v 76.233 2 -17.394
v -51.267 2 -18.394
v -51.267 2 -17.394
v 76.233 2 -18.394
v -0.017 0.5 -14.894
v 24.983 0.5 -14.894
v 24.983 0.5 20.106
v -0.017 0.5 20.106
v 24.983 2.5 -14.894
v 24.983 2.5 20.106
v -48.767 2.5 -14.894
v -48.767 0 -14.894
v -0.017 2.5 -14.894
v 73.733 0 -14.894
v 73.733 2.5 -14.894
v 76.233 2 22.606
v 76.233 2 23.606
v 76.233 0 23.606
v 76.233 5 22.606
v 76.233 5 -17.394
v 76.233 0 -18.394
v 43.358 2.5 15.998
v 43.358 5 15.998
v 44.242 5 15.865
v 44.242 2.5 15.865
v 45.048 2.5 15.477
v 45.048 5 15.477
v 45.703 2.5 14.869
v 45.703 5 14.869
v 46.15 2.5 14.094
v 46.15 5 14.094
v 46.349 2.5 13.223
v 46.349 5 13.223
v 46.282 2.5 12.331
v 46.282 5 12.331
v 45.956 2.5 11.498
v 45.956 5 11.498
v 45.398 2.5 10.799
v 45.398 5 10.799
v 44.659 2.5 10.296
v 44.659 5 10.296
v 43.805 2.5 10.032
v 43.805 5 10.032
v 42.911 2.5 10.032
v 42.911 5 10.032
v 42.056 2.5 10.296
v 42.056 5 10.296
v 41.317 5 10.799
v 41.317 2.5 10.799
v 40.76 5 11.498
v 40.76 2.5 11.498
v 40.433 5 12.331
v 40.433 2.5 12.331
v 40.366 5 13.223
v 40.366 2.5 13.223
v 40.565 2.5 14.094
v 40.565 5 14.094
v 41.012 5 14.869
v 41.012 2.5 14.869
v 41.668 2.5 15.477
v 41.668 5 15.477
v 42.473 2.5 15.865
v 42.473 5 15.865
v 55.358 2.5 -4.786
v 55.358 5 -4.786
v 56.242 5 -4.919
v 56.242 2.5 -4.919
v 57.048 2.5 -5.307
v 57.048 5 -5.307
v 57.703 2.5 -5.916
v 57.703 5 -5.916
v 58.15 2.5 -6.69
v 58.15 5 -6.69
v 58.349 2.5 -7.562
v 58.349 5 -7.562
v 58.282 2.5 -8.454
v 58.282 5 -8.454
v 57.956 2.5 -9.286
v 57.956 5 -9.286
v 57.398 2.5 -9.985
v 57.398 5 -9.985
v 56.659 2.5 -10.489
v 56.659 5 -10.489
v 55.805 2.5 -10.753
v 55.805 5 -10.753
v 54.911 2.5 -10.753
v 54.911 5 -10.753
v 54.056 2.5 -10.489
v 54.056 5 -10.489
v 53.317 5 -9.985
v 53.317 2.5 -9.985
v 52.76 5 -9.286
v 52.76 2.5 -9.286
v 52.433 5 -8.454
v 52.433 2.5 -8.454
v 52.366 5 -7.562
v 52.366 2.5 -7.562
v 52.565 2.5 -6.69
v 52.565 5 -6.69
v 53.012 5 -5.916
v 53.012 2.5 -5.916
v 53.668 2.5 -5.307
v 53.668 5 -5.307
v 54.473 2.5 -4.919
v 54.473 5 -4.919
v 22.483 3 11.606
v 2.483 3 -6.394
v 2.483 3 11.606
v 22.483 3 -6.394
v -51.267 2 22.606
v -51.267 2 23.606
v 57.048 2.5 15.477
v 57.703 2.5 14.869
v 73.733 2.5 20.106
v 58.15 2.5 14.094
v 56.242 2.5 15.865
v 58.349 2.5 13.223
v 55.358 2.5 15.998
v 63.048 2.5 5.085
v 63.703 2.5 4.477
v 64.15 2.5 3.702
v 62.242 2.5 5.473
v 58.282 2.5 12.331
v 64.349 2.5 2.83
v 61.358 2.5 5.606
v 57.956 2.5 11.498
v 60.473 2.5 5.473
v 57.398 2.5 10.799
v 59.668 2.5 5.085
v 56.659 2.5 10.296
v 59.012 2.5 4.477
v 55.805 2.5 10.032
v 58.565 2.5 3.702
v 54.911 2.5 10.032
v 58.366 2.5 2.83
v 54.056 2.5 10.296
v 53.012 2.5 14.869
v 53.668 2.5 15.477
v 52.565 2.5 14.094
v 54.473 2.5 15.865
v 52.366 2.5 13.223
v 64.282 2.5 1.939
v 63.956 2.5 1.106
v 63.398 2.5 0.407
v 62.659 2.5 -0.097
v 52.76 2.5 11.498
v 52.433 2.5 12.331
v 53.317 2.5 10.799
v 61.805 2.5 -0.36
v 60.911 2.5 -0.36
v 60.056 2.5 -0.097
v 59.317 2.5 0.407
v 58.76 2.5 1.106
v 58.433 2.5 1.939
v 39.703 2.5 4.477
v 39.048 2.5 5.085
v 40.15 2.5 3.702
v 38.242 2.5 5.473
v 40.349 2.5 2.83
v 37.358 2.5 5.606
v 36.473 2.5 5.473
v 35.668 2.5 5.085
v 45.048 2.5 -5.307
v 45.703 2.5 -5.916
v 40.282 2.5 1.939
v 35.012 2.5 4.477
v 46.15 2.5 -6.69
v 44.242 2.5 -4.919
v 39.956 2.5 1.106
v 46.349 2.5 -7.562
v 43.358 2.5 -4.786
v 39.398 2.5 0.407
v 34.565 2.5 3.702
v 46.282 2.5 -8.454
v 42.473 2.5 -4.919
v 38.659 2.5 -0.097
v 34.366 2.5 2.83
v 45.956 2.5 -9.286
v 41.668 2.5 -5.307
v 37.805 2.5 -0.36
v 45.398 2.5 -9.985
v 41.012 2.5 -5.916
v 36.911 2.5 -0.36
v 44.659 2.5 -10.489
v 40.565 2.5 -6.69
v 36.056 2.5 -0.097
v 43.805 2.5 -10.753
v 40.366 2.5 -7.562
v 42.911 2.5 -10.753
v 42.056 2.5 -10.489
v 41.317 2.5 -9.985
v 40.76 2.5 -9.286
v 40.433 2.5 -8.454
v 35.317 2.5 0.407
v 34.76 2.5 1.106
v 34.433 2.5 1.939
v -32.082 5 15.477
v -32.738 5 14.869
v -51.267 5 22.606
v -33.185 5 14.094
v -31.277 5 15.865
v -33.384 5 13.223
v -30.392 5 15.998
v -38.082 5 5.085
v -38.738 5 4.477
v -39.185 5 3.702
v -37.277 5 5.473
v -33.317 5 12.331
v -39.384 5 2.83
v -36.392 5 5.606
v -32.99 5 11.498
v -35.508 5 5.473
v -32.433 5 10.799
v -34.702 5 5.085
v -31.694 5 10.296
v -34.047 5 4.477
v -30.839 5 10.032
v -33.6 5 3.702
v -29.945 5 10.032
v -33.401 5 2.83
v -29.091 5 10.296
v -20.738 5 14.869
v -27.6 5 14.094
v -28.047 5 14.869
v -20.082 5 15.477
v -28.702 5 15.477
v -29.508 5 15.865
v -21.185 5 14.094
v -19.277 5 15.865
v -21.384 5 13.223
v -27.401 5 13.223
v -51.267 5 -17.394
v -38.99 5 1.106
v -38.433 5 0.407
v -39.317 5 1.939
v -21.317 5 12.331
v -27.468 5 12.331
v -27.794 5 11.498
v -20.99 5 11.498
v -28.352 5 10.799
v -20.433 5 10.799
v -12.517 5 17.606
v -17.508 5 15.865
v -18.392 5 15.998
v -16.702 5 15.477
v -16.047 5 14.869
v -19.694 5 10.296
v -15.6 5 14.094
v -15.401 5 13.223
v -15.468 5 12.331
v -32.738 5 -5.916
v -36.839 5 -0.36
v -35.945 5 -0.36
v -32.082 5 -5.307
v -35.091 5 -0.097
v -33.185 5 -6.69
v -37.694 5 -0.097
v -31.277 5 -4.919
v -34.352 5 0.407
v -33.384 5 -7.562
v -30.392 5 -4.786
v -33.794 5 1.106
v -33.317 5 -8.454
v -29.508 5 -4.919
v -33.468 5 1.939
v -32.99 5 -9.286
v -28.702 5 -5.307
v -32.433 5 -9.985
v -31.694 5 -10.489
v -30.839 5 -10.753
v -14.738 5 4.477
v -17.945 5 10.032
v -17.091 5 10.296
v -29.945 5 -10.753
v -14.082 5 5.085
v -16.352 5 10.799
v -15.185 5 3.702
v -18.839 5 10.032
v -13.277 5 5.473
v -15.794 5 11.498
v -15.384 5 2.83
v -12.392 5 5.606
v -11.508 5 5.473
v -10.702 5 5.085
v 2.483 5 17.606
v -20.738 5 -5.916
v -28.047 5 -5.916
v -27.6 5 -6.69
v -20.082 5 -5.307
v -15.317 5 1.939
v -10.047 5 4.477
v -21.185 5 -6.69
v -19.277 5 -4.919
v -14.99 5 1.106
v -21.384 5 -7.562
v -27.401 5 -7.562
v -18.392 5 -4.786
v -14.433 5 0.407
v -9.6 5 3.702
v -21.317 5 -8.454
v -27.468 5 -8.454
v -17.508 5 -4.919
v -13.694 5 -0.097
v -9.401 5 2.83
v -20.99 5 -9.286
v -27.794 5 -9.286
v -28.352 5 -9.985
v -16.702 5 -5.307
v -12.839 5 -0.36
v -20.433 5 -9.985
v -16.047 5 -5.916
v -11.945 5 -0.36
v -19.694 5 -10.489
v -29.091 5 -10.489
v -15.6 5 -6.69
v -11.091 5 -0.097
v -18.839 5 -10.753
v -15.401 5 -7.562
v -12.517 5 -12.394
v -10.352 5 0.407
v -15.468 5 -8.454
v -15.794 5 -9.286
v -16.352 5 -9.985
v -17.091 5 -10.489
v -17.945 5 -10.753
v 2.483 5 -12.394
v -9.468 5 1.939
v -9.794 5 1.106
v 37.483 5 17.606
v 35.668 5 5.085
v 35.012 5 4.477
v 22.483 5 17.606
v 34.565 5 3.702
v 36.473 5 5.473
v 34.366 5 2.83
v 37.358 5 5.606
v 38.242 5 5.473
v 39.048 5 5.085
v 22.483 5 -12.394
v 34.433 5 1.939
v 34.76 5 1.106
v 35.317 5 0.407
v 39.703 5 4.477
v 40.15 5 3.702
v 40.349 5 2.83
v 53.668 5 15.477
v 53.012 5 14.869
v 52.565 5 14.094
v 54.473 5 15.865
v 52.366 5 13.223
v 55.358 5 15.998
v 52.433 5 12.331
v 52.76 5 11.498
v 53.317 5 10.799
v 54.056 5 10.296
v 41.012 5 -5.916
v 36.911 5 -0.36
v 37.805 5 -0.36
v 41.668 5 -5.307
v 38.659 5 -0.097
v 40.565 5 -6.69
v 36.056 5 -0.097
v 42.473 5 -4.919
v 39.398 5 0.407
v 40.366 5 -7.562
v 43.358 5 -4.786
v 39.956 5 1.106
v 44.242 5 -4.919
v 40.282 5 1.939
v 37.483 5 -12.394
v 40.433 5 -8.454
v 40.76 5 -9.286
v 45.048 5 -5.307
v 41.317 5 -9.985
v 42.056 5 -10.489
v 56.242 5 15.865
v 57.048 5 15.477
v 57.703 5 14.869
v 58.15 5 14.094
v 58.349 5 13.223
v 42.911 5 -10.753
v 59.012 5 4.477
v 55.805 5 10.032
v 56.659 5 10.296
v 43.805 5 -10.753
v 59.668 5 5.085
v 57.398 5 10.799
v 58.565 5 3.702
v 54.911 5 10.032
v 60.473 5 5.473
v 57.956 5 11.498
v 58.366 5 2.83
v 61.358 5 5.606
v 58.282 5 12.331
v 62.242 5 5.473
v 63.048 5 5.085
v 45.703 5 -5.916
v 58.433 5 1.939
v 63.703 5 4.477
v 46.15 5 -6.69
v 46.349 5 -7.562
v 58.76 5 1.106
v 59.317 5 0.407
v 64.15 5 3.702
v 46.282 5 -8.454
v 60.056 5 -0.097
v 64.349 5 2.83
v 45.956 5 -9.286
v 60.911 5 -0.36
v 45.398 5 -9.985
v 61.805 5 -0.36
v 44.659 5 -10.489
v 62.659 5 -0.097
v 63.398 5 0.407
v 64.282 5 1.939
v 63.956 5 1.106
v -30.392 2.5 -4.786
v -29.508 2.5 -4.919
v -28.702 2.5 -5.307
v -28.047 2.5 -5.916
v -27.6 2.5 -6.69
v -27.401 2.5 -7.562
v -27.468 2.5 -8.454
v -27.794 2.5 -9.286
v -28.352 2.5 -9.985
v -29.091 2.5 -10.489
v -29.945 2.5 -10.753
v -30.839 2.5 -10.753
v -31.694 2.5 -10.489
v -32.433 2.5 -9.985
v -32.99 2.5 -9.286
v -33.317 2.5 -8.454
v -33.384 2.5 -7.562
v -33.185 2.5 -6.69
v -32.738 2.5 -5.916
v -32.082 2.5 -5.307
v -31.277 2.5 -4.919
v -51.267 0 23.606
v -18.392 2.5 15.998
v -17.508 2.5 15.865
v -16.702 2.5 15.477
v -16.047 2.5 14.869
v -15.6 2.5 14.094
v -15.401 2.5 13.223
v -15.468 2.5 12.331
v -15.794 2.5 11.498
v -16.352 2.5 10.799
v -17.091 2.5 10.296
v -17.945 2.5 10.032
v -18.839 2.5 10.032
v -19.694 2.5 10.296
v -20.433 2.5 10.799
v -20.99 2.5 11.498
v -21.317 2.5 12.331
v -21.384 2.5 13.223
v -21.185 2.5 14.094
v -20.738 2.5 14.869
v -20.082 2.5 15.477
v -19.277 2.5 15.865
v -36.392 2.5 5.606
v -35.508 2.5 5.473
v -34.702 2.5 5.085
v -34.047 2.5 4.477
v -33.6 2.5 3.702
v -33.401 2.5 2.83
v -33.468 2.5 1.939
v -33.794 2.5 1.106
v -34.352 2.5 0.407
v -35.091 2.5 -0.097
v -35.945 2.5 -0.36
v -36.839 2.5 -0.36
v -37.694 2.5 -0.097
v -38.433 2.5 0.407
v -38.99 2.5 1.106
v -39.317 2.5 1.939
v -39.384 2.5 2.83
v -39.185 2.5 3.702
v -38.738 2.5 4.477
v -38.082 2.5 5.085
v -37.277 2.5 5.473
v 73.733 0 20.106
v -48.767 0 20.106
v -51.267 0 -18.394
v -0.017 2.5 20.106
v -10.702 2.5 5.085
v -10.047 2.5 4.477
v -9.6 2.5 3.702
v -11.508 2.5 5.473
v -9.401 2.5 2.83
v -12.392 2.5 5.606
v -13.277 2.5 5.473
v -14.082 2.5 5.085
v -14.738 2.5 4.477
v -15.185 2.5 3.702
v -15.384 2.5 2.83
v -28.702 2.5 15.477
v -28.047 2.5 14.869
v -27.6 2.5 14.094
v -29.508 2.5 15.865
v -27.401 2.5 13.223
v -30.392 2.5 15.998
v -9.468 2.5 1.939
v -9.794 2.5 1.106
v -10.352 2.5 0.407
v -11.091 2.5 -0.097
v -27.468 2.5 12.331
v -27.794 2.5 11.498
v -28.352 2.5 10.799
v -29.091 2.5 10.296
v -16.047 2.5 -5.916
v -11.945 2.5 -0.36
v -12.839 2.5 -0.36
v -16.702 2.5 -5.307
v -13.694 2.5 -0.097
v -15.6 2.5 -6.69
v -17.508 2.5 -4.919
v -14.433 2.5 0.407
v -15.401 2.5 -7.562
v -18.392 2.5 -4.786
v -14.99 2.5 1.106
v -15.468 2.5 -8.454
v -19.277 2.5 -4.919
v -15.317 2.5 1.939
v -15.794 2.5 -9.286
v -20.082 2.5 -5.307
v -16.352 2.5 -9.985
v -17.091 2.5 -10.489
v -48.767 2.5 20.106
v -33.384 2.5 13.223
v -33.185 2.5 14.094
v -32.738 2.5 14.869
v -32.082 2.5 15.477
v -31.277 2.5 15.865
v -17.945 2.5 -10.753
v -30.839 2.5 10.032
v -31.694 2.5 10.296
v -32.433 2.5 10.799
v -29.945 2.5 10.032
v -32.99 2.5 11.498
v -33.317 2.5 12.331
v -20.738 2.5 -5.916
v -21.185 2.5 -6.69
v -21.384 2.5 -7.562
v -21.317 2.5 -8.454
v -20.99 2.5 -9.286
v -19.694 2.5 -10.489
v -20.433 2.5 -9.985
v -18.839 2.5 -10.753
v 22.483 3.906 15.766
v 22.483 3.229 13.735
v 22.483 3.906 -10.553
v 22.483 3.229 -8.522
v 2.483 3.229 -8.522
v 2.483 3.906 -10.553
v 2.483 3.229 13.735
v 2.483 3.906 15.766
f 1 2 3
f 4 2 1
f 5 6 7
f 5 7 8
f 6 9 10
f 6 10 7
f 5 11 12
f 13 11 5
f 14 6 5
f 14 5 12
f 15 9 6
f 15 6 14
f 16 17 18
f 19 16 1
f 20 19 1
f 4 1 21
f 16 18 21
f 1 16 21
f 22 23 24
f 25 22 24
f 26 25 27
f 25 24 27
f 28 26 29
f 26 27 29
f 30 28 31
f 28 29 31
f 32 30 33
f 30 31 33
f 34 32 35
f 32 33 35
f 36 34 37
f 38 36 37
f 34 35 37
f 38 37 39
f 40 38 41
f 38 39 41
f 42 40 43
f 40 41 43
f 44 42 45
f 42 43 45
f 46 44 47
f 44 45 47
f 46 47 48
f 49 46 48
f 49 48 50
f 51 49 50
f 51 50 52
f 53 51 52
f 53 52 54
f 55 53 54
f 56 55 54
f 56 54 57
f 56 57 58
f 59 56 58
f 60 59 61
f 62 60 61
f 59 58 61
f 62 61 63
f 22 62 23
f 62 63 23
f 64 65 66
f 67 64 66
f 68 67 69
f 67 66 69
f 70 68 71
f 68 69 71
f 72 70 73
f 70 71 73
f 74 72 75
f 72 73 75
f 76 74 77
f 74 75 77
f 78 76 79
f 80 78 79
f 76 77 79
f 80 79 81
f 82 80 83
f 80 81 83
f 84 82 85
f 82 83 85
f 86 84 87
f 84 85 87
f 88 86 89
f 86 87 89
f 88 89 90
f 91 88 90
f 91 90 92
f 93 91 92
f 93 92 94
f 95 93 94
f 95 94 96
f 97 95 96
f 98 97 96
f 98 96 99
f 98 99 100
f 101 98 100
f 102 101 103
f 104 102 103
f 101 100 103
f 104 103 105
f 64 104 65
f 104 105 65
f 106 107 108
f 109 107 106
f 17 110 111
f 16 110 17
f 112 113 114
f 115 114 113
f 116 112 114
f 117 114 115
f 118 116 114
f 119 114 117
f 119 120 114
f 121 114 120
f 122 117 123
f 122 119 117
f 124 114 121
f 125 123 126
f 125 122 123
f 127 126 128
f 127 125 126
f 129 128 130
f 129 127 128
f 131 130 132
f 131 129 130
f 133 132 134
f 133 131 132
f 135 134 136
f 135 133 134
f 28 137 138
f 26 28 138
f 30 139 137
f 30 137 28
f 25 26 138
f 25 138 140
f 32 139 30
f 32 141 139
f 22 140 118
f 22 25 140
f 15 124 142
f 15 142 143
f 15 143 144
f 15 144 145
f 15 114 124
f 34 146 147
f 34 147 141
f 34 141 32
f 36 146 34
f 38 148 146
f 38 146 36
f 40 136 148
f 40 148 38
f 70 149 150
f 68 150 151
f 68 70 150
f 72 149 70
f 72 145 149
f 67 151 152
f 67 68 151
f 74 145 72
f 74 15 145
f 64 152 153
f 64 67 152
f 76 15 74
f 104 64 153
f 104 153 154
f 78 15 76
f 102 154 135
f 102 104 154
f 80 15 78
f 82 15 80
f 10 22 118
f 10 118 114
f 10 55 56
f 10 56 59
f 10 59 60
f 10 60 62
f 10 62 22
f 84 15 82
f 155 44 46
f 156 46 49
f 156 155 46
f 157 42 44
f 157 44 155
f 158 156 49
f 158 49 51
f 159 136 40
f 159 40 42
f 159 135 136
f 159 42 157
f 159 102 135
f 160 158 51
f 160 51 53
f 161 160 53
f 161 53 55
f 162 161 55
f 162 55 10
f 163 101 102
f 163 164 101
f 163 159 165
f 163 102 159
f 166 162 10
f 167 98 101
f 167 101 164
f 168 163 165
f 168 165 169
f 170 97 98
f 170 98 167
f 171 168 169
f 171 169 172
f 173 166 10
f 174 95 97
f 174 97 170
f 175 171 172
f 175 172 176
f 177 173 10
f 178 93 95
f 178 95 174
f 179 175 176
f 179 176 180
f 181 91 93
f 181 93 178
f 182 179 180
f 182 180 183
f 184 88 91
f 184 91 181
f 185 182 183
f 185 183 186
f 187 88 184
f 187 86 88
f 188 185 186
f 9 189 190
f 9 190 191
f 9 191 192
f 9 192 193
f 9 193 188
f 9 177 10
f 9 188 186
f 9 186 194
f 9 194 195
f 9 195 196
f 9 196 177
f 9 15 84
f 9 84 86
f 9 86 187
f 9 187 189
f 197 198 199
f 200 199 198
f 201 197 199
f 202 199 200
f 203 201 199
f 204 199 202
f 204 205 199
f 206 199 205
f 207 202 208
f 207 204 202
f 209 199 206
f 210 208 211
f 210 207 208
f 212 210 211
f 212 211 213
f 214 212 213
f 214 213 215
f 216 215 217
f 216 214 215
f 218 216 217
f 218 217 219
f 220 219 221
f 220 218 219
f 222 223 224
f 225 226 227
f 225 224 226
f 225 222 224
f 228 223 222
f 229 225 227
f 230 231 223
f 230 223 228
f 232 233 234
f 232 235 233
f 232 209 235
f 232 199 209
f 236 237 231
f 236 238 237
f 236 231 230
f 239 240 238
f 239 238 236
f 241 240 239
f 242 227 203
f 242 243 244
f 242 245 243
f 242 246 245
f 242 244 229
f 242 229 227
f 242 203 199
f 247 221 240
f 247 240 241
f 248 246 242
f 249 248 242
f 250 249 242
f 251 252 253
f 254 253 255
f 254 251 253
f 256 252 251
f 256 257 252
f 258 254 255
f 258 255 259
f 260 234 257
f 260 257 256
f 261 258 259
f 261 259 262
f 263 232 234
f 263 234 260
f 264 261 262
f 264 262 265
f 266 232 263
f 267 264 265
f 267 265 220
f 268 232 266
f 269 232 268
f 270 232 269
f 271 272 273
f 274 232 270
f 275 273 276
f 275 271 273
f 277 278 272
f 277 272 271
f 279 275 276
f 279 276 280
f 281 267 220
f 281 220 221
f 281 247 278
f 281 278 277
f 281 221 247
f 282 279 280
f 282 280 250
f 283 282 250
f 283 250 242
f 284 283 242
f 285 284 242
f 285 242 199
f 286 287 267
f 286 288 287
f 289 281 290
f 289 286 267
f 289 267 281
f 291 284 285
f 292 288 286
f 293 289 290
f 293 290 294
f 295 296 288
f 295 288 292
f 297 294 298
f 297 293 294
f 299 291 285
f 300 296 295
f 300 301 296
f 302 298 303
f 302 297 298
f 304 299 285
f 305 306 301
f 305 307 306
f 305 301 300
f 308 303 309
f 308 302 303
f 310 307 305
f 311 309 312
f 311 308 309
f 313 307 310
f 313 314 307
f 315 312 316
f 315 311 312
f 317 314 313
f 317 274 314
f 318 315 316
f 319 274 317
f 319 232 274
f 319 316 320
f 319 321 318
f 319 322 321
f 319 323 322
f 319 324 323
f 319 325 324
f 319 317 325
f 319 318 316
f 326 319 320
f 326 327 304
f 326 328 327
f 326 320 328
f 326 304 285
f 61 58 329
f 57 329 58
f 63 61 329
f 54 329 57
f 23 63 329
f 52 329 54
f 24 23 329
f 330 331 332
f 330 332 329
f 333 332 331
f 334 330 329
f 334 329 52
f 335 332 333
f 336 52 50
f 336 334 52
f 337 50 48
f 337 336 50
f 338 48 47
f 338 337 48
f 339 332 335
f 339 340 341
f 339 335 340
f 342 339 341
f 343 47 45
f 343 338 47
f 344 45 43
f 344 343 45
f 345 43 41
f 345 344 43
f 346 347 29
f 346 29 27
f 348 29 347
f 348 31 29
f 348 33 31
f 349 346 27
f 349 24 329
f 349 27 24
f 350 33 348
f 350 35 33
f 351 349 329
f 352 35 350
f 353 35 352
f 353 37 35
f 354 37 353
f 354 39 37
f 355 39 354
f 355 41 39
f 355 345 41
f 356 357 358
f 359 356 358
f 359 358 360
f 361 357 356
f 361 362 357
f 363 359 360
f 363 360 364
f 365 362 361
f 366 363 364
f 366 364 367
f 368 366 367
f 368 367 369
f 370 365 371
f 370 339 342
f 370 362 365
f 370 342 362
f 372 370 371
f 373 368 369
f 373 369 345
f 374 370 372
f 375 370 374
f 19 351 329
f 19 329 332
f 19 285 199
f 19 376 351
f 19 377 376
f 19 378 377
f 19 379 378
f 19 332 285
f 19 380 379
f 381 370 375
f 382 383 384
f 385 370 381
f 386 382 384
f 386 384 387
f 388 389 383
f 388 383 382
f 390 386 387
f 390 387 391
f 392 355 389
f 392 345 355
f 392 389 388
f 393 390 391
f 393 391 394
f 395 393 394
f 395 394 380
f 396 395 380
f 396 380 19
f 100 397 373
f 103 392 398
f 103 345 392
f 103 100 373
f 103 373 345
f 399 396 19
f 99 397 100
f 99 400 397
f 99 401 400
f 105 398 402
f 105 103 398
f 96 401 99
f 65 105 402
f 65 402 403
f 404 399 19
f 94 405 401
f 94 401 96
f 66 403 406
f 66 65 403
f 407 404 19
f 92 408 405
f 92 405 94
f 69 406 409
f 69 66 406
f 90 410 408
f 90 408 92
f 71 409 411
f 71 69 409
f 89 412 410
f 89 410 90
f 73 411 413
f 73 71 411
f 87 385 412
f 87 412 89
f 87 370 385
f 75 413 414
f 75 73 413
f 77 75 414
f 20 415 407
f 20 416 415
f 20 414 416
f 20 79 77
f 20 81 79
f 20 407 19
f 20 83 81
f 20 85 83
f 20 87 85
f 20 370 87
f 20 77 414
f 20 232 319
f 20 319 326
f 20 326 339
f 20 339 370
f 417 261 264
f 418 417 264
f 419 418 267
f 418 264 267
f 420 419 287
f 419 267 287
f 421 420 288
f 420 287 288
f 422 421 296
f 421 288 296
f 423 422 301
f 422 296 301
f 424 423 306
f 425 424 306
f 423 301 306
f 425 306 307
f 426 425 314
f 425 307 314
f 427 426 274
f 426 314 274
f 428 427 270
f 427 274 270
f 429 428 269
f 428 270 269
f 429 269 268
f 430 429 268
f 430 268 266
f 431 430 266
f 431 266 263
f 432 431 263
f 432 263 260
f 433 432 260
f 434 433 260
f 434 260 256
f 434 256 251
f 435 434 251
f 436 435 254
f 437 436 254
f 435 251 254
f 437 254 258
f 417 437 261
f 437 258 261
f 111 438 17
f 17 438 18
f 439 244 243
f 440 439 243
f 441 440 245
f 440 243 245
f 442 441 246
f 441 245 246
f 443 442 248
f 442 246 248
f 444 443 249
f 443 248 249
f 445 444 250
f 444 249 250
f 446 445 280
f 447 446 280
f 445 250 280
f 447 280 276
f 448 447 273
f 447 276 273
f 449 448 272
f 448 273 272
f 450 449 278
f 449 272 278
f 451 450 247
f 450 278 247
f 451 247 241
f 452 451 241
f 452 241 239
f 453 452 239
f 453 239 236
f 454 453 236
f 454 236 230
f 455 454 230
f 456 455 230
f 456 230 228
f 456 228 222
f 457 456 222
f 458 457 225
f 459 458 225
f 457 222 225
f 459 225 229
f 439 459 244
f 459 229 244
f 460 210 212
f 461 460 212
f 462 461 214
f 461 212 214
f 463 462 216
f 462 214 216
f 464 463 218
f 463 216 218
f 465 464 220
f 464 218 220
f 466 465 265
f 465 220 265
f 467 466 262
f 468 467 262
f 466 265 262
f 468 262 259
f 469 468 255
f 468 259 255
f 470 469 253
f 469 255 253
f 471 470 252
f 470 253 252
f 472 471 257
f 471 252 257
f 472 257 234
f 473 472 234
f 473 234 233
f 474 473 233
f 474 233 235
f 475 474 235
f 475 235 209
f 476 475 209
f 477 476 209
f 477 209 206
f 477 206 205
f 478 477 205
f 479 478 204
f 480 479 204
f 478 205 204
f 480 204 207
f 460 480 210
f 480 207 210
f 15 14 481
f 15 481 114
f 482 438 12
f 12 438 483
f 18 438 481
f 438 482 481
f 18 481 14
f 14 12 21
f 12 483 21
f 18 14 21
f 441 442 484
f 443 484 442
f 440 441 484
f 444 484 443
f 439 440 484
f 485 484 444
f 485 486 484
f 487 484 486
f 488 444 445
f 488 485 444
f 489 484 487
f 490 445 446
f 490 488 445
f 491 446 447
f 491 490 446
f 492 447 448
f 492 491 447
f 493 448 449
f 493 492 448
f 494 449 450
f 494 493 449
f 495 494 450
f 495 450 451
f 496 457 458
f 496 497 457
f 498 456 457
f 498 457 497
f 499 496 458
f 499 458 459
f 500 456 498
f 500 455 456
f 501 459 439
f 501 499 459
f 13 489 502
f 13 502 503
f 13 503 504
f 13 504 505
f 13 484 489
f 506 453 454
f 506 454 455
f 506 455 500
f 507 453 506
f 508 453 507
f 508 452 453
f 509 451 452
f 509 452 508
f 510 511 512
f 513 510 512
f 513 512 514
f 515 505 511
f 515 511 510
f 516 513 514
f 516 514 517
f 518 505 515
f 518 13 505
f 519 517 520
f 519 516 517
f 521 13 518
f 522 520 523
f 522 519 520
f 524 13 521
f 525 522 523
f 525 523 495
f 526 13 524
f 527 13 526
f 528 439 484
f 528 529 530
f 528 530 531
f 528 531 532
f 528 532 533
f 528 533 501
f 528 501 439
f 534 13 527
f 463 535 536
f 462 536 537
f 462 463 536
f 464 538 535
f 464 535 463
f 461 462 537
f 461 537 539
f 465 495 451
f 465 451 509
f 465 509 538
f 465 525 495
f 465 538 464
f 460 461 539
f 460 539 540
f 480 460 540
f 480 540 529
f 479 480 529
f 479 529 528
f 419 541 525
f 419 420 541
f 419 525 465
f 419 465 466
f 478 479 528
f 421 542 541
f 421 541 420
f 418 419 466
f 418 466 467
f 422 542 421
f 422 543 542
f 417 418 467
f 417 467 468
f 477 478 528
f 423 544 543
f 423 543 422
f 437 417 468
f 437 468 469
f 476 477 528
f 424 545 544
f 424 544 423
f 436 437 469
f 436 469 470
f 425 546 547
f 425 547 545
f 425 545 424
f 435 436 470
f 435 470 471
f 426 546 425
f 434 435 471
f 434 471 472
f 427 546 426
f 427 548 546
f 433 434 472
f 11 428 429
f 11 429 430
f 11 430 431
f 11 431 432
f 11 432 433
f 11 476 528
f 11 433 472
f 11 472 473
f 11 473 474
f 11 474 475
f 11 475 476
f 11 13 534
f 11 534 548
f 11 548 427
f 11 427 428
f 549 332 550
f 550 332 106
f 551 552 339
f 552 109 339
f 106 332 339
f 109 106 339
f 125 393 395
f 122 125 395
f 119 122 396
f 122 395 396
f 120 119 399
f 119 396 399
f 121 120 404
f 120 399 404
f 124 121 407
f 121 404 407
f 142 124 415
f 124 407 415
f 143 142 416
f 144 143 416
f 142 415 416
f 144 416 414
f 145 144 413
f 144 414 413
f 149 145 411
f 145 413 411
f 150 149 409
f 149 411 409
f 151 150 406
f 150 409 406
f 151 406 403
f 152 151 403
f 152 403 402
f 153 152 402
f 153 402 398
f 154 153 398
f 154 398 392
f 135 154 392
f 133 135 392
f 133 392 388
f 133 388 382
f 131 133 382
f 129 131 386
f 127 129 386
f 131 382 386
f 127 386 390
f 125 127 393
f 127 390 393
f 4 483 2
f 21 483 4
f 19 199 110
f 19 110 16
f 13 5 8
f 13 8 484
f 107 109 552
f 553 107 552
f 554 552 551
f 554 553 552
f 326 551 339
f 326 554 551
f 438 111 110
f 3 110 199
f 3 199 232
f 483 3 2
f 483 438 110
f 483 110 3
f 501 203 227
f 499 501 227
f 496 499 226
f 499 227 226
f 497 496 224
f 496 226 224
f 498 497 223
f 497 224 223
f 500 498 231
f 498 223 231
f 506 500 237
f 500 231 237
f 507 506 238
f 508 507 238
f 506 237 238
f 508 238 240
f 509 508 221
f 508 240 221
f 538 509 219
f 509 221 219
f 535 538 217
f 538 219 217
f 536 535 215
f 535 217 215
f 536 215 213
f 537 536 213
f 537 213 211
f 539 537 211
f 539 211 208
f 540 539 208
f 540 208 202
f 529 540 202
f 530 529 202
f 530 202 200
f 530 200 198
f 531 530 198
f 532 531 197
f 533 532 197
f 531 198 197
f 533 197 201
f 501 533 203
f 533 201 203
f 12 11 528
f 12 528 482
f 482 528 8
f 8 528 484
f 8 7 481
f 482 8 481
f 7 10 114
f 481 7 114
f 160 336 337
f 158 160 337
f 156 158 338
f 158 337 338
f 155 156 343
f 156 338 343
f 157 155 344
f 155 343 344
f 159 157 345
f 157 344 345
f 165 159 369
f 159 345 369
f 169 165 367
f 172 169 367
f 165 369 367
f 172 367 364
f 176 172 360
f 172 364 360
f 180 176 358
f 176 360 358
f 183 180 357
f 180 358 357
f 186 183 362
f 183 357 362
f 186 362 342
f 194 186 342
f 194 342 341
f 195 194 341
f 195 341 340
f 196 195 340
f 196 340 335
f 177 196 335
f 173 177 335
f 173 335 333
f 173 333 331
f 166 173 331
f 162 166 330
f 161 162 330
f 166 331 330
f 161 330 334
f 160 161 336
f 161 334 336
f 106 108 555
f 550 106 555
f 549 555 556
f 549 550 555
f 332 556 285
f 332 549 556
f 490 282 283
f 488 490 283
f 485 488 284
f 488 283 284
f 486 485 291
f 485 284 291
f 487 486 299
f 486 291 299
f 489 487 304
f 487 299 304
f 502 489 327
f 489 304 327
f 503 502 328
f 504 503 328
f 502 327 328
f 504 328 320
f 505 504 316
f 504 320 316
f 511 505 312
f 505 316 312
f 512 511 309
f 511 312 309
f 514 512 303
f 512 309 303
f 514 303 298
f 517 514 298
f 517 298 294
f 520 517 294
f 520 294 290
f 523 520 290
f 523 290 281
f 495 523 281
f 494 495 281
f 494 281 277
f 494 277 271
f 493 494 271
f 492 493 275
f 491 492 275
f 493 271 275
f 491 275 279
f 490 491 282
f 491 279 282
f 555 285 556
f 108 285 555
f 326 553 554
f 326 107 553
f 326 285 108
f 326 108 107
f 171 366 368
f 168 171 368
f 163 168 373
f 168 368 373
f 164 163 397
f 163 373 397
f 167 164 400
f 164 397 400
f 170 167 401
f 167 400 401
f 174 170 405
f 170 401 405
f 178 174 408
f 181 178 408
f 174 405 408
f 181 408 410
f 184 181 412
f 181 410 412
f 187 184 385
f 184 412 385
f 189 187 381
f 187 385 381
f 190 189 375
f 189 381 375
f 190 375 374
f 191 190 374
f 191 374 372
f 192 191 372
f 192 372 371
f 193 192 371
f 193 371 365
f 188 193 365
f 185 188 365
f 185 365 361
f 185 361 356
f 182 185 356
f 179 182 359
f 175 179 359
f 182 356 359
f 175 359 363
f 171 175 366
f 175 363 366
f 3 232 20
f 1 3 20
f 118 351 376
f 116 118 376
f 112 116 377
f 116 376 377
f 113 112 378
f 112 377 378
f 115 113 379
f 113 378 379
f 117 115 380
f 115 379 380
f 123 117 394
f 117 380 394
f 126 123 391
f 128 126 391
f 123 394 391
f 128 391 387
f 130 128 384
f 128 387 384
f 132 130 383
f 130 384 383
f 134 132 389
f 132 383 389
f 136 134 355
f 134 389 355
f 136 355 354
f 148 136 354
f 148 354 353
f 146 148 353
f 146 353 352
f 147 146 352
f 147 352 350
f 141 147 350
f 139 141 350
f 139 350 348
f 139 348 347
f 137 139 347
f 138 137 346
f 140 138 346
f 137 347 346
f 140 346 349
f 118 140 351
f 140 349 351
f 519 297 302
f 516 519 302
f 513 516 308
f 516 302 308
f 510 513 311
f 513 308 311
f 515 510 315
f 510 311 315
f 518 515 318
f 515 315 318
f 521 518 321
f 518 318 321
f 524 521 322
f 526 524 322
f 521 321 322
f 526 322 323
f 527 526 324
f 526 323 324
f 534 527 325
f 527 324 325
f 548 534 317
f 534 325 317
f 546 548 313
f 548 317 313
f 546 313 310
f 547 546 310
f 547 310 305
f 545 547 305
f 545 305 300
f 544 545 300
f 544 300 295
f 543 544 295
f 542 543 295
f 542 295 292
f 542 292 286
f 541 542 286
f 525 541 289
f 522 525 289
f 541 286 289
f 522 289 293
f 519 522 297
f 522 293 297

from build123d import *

# Parameters (mm, degrees)
SKETCH1_W           = 127.5
SKETCH1_H           = 42
BOSS_EXTRUDE1_DEPTH = 5
SKETCH2_W           = 127.5
SKETCH2_H           = 1
CUT_EXTRUDE1_DEPTH  = 3
SKETCH7_W           = 20
SKETCH7_H           = 30
CUT_EXTRUDE5_DEPTH  = 2
SHELL8_START        = -14.893859366
SHELL8_DEPTH        = 35
FILLET3_R           = 10
FILLET4_R           = 10
SKETCH10_R          = 3
CUT_EXTRUDE6_DEPTH  = 2.5


# Read off the part's stored shape, not the designer's step: Shell8
with BuildPart() as part:
    # Sketch1 → Boss-Extrude1 (new body)
    with BuildSketch(Plane(origin=(0, 0, 0), x_dir=(1, 0, 0), z_dir=(0, 1, 0))):
        with Locations((12.48267617, -2.606140634)):
            Rectangle(SKETCH1_W, SKETCH1_H)
    extrude(amount=BOSS_EXTRUDE1_DEPTH)

    # Sketch2 → Cut-Extrude1 (cut)
    with BuildSketch(Plane(origin=(0, 5, 0), x_dir=(1, 0, 0), z_dir=(0, 1, 0))):
        with Locations((12.48267617, 17.893859366)):
            Rectangle(SKETCH2_W, SKETCH2_H)
        with Locations((12.48267617, -23.106140634)):
            Rectangle(SKETCH2_W, SKETCH2_H)
    extrude(amount=-CUT_EXTRUDE1_DEPTH, mode=Mode.SUBTRACT)

    # Sketch7 → Cut-Extrude5 (cut)
    with BuildSketch(Plane(origin=(0, 5, 0), x_dir=(1, 0, 0), z_dir=(0, 1, 0))):
        with Locations((12.48267617, -2.606140634)):
            Rectangle(SKETCH7_W, SKETCH7_H)
    extrude(amount=-CUT_EXTRUDE5_DEPTH, mode=Mode.SUBTRACT)

    # Shell8 outline → Shell8 (cut)
    with BuildSketch(Plane.XY.offset(SHELL8_START)):
        Polygon((-0.01732383, 0.5), (-0.01732383, 2.5), (-48.76732383, 2.5), (-48.76732383, 0), (73.73267617, 0), (73.73267617, 2.5), (24.98267617, 2.5), (24.98267617, 0.5), align=None)
    extrude(amount=SHELL8_DEPTH, mode=Mode.SUBTRACT)

    # Fillet3
    # the kernel refuses this fillet: 10 mm, written as the material it adds along each edge
    with BuildSketch(Plane(origin=(37.48267617, 3, 17.606140634), x_dir=(0, 1, 0), z_dir=(-1, 0, 0))) as fillet3_piece_1:
        with BuildLine():
            CenterArc((10, 6), FILLET3_R, 180, 36.869897646)
            Line((0, 6), (-0.2, 6))
            Line((-0.2, 6), (-0.2, 0))
            Line((-0.2, 0), (0, -0.2))
            ThreePointArc((0, -0.2), (1, -0.2), (1.84, -0.12))
            Line((1.84, -0.12), (2, 0))
        make_face()
    extrude(amount=50)

    # Fillet4
    # the kernel refuses this fillet: 10 mm, written as the material it adds along each edge
    with BuildSketch(Plane(origin=(-12.51732383, 3, -12.393859366), x_dir=(0, 0, 1), z_dir=(1, 0, 0))) as fillet4_piece_1:
        with BuildLine():
            CenterArc((6, -10), FILLET4_R, 90, 36.869897646)
            Line((0, -2), (-0.12, -1.84))
            ThreePointArc((-0.12, -1.84), (-0.2, -1), (-0.2, 0))
            Line((-0.2, 0), (0, 0.2))
            Line((0, 0.2), (6, 0.2))
            Line((6, 0.2), (6, 0))
        make_face()
    extrude(amount=50)

    # Sketch10 → Cut-Extrude6 (cut)
    with BuildSketch(Plane(origin=(0, 5, 0), x_dir=(1, 0, 0), z_dir=(0, 1, 0))):
        with Locations(Location((-12.39232383, -2.606140634, 0), (0, 0, 270))):
            Circle(SKETCH10_R)
        with Locations(Location((-18.39232383, -12.998445479, 0), (0, 0, 270))):
            Circle(SKETCH10_R)
        with Locations(Location((-30.39232383, -12.998445479, 0), (0, 0, 270))):
            Circle(SKETCH10_R)
        with Locations(Location((-36.39232383, -2.606140634, 0), (0, 0, 270))):
            Circle(SKETCH10_R)
        with Locations(Location((-30.39232383, 7.786164212, 0), (0, 0, 270))):
            Circle(SKETCH10_R)
        with Locations(Location((-18.39232383, 7.786164212, 0), (0, 0, 270))):
            Circle(SKETCH10_R)
        with Locations(Location((61.35767617, -2.606140634, 0), (0, 0, 270))):
            Circle(SKETCH10_R)
        with Locations(Location((55.35767617, -12.998445479, 0), (0, 0, 270))):
            Circle(SKETCH10_R)
        with Locations(Location((43.35767617, -12.998445479, 0), (0, 0, 270))):
            Circle(SKETCH10_R)
        with Locations(Location((37.35767617, -2.606140634, 0), (0, 0, 270))):
            Circle(SKETCH10_R)
        with Locations(Location((43.35767617, 7.786164212, 0), (0, 0, 270))):
            Circle(SKETCH10_R)
        with Locations(Location((55.35767617, 7.786164212, 0), (0, 0, 270))):
            Circle(SKETCH10_R)
    extrude(amount=-CUT_EXTRUDE6_DEPTH, mode=Mode.SUBTRACT)


solid = part.part
